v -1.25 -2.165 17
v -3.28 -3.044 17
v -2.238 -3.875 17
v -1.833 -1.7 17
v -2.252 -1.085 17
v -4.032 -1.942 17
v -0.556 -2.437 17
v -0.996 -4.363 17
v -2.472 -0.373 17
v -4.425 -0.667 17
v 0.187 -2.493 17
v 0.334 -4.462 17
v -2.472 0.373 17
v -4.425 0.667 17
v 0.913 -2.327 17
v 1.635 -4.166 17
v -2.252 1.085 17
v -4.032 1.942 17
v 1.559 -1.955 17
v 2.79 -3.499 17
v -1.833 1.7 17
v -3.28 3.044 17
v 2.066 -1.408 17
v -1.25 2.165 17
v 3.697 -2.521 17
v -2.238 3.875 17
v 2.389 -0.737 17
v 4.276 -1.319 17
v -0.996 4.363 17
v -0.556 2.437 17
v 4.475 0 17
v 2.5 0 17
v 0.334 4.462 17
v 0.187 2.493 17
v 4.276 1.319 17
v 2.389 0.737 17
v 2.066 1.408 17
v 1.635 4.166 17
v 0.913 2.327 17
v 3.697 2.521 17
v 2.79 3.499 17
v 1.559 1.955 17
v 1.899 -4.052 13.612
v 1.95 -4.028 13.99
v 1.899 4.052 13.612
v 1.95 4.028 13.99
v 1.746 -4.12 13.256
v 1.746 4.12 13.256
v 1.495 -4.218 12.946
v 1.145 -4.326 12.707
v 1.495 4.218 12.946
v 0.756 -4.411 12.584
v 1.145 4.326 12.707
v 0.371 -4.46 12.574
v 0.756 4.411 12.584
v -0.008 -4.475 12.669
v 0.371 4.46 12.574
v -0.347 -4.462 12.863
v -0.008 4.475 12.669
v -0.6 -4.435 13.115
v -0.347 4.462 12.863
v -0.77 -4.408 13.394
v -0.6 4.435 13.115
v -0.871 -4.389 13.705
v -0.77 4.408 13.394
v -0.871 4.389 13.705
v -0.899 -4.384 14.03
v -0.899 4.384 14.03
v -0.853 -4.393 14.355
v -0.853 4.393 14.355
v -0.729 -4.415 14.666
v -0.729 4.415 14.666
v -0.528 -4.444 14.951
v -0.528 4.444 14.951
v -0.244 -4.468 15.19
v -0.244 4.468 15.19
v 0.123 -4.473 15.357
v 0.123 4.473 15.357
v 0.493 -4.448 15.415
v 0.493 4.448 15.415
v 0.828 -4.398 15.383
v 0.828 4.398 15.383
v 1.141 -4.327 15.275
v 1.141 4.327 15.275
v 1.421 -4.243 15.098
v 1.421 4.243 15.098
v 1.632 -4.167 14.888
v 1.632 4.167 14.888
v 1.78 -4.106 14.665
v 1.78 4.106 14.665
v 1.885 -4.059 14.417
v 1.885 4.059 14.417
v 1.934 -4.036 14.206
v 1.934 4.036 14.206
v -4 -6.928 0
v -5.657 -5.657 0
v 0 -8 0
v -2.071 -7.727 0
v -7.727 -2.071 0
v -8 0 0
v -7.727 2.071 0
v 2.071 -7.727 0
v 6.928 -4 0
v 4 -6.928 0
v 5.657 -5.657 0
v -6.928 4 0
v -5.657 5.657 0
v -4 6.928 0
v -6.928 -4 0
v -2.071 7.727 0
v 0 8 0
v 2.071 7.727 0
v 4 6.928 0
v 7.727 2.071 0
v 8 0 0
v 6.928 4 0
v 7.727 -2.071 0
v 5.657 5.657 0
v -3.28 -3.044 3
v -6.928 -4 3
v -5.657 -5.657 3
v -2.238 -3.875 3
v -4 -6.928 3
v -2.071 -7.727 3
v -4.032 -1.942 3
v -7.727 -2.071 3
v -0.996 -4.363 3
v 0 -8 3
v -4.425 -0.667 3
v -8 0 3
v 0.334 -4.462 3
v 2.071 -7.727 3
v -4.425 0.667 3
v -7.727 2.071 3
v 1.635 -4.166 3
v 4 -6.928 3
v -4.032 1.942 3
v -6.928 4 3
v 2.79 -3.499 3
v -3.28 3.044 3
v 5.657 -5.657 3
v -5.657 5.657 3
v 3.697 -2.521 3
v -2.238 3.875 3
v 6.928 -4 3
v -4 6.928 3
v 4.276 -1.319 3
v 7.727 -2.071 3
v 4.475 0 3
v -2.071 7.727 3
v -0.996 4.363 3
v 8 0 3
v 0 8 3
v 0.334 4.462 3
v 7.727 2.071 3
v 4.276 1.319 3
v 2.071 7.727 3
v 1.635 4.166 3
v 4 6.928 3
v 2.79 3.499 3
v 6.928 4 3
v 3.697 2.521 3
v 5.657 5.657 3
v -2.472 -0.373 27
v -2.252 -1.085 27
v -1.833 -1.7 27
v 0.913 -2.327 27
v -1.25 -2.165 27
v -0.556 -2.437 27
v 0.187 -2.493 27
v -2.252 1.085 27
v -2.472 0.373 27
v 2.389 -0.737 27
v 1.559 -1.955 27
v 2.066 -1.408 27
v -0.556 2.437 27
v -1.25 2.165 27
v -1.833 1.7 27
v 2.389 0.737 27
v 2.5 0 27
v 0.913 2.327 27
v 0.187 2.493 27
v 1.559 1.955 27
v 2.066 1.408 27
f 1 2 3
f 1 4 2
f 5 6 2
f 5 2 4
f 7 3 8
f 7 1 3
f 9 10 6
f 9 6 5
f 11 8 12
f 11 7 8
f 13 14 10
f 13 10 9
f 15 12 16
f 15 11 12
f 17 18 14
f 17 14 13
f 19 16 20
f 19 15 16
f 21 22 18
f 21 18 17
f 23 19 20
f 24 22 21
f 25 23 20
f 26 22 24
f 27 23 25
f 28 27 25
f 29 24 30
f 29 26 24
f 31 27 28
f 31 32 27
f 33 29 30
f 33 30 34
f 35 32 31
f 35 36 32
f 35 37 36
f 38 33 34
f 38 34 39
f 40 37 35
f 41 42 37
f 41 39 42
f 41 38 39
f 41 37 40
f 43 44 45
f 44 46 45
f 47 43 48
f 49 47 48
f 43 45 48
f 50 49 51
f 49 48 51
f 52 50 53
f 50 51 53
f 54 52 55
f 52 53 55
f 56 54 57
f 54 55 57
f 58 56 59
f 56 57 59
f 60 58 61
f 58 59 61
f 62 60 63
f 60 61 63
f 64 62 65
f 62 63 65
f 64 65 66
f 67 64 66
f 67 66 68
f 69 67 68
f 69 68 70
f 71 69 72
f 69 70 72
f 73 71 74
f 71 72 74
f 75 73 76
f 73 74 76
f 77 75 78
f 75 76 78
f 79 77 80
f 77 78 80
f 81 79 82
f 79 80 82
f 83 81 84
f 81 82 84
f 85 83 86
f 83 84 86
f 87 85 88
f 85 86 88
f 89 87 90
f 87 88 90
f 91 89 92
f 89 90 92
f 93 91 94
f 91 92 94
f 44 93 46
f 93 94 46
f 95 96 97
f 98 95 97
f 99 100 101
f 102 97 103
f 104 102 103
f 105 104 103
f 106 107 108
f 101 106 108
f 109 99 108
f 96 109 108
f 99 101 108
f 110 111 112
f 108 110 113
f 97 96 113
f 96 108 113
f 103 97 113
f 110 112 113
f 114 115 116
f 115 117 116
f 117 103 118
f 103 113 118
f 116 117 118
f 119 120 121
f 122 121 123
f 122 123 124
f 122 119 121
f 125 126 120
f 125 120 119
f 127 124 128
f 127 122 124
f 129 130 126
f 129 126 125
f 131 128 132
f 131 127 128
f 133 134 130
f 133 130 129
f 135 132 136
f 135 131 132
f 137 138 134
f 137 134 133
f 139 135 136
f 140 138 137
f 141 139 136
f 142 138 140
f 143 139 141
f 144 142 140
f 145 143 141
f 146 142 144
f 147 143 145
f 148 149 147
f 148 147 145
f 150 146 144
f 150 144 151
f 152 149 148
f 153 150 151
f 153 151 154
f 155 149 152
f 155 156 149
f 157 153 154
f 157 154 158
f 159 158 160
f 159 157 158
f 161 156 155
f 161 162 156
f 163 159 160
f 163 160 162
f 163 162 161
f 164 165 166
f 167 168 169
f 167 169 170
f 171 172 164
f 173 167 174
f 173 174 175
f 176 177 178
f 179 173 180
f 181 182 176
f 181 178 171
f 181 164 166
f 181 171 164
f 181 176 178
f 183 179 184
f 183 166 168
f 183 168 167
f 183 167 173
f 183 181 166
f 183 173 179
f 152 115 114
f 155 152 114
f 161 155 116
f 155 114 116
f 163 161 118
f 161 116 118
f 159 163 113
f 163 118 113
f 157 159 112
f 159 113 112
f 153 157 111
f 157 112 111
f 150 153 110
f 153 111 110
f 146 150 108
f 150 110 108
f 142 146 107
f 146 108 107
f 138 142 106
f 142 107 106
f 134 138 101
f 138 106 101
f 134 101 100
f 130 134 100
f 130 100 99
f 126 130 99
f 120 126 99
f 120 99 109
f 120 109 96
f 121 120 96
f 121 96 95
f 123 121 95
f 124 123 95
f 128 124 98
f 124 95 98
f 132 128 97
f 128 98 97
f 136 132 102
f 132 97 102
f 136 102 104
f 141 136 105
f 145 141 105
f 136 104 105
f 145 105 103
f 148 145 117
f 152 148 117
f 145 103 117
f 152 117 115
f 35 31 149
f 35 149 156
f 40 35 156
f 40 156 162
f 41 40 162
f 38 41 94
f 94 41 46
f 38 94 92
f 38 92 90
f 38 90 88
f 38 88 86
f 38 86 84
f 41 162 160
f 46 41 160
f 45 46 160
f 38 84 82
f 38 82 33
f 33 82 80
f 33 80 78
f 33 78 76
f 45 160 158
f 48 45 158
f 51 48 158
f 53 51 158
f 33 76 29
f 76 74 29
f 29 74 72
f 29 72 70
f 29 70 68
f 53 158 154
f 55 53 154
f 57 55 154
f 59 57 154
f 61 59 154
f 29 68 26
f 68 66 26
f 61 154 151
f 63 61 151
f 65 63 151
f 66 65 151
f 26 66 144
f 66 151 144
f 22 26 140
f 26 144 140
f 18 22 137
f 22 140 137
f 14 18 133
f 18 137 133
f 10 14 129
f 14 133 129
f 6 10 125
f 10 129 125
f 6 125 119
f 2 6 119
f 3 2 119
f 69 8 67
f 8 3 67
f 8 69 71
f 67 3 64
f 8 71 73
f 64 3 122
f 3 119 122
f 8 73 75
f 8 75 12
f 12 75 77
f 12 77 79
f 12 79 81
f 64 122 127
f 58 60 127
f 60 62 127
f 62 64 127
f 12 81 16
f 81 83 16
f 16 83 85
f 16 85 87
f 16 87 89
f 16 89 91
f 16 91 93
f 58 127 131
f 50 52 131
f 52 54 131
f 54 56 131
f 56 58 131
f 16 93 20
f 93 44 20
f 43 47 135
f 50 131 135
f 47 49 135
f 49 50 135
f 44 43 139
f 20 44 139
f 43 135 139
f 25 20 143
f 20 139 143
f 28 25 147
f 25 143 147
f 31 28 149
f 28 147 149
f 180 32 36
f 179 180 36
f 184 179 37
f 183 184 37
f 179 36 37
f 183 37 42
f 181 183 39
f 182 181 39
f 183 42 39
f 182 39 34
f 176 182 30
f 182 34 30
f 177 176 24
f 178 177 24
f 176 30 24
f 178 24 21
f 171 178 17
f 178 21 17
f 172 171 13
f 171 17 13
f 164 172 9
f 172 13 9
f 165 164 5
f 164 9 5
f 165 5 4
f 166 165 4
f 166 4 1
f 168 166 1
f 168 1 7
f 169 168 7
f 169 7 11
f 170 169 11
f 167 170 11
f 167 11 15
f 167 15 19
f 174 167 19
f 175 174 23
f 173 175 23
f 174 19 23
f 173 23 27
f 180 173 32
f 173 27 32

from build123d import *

# Parameters (mm, degrees)
SKETCH1_R           = 8
BOSS_EXTRUDE1_DEPTH = 3
SKETCH2_R           = 4.475
BOSS_EXTRUDE2_DEPTH = 14
SKETCH3_R           = 2.5
BOSS_EXTRUDE3_DEPTH = 10
SKETCH4_R           = 1.425
CUT_EXTRUDE1_DEPTH  = 7.5


with BuildPart() as part:
    # Sketch1 → Boss-Extrude1 (new body)
    with BuildSketch(Plane.XY):
        Circle(SKETCH1_R)
    extrude(amount=BOSS_EXTRUDE1_DEPTH)

    # Sketch2 → Boss-Extrude2 (add)
    with BuildSketch(Plane.XY.offset(3)):
        Circle(SKETCH2_R)
    extrude(amount=BOSS_EXTRUDE2_DEPTH)

    # Sketch3 → Boss-Extrude3 (add)
    with BuildSketch(Plane.XY.offset(17)):
        Circle(SKETCH3_R)
    extrude(amount=BOSS_EXTRUDE3_DEPTH)

    # Sketch4 → Cut-Extrude1 (cut, symmetric)
    with BuildSketch(Plane(origin=(0, 0, 0), x_dir=(1, 0, 0), z_dir=(0, 1, 0))):
        with Locations((0.525, -13.990152787)):
            Circle(SKETCH4_R)
    extrude(amount=CUT_EXTRUDE1_DEPTH, both=True, mode=Mode.SUBTRACT)


solid = part.part
